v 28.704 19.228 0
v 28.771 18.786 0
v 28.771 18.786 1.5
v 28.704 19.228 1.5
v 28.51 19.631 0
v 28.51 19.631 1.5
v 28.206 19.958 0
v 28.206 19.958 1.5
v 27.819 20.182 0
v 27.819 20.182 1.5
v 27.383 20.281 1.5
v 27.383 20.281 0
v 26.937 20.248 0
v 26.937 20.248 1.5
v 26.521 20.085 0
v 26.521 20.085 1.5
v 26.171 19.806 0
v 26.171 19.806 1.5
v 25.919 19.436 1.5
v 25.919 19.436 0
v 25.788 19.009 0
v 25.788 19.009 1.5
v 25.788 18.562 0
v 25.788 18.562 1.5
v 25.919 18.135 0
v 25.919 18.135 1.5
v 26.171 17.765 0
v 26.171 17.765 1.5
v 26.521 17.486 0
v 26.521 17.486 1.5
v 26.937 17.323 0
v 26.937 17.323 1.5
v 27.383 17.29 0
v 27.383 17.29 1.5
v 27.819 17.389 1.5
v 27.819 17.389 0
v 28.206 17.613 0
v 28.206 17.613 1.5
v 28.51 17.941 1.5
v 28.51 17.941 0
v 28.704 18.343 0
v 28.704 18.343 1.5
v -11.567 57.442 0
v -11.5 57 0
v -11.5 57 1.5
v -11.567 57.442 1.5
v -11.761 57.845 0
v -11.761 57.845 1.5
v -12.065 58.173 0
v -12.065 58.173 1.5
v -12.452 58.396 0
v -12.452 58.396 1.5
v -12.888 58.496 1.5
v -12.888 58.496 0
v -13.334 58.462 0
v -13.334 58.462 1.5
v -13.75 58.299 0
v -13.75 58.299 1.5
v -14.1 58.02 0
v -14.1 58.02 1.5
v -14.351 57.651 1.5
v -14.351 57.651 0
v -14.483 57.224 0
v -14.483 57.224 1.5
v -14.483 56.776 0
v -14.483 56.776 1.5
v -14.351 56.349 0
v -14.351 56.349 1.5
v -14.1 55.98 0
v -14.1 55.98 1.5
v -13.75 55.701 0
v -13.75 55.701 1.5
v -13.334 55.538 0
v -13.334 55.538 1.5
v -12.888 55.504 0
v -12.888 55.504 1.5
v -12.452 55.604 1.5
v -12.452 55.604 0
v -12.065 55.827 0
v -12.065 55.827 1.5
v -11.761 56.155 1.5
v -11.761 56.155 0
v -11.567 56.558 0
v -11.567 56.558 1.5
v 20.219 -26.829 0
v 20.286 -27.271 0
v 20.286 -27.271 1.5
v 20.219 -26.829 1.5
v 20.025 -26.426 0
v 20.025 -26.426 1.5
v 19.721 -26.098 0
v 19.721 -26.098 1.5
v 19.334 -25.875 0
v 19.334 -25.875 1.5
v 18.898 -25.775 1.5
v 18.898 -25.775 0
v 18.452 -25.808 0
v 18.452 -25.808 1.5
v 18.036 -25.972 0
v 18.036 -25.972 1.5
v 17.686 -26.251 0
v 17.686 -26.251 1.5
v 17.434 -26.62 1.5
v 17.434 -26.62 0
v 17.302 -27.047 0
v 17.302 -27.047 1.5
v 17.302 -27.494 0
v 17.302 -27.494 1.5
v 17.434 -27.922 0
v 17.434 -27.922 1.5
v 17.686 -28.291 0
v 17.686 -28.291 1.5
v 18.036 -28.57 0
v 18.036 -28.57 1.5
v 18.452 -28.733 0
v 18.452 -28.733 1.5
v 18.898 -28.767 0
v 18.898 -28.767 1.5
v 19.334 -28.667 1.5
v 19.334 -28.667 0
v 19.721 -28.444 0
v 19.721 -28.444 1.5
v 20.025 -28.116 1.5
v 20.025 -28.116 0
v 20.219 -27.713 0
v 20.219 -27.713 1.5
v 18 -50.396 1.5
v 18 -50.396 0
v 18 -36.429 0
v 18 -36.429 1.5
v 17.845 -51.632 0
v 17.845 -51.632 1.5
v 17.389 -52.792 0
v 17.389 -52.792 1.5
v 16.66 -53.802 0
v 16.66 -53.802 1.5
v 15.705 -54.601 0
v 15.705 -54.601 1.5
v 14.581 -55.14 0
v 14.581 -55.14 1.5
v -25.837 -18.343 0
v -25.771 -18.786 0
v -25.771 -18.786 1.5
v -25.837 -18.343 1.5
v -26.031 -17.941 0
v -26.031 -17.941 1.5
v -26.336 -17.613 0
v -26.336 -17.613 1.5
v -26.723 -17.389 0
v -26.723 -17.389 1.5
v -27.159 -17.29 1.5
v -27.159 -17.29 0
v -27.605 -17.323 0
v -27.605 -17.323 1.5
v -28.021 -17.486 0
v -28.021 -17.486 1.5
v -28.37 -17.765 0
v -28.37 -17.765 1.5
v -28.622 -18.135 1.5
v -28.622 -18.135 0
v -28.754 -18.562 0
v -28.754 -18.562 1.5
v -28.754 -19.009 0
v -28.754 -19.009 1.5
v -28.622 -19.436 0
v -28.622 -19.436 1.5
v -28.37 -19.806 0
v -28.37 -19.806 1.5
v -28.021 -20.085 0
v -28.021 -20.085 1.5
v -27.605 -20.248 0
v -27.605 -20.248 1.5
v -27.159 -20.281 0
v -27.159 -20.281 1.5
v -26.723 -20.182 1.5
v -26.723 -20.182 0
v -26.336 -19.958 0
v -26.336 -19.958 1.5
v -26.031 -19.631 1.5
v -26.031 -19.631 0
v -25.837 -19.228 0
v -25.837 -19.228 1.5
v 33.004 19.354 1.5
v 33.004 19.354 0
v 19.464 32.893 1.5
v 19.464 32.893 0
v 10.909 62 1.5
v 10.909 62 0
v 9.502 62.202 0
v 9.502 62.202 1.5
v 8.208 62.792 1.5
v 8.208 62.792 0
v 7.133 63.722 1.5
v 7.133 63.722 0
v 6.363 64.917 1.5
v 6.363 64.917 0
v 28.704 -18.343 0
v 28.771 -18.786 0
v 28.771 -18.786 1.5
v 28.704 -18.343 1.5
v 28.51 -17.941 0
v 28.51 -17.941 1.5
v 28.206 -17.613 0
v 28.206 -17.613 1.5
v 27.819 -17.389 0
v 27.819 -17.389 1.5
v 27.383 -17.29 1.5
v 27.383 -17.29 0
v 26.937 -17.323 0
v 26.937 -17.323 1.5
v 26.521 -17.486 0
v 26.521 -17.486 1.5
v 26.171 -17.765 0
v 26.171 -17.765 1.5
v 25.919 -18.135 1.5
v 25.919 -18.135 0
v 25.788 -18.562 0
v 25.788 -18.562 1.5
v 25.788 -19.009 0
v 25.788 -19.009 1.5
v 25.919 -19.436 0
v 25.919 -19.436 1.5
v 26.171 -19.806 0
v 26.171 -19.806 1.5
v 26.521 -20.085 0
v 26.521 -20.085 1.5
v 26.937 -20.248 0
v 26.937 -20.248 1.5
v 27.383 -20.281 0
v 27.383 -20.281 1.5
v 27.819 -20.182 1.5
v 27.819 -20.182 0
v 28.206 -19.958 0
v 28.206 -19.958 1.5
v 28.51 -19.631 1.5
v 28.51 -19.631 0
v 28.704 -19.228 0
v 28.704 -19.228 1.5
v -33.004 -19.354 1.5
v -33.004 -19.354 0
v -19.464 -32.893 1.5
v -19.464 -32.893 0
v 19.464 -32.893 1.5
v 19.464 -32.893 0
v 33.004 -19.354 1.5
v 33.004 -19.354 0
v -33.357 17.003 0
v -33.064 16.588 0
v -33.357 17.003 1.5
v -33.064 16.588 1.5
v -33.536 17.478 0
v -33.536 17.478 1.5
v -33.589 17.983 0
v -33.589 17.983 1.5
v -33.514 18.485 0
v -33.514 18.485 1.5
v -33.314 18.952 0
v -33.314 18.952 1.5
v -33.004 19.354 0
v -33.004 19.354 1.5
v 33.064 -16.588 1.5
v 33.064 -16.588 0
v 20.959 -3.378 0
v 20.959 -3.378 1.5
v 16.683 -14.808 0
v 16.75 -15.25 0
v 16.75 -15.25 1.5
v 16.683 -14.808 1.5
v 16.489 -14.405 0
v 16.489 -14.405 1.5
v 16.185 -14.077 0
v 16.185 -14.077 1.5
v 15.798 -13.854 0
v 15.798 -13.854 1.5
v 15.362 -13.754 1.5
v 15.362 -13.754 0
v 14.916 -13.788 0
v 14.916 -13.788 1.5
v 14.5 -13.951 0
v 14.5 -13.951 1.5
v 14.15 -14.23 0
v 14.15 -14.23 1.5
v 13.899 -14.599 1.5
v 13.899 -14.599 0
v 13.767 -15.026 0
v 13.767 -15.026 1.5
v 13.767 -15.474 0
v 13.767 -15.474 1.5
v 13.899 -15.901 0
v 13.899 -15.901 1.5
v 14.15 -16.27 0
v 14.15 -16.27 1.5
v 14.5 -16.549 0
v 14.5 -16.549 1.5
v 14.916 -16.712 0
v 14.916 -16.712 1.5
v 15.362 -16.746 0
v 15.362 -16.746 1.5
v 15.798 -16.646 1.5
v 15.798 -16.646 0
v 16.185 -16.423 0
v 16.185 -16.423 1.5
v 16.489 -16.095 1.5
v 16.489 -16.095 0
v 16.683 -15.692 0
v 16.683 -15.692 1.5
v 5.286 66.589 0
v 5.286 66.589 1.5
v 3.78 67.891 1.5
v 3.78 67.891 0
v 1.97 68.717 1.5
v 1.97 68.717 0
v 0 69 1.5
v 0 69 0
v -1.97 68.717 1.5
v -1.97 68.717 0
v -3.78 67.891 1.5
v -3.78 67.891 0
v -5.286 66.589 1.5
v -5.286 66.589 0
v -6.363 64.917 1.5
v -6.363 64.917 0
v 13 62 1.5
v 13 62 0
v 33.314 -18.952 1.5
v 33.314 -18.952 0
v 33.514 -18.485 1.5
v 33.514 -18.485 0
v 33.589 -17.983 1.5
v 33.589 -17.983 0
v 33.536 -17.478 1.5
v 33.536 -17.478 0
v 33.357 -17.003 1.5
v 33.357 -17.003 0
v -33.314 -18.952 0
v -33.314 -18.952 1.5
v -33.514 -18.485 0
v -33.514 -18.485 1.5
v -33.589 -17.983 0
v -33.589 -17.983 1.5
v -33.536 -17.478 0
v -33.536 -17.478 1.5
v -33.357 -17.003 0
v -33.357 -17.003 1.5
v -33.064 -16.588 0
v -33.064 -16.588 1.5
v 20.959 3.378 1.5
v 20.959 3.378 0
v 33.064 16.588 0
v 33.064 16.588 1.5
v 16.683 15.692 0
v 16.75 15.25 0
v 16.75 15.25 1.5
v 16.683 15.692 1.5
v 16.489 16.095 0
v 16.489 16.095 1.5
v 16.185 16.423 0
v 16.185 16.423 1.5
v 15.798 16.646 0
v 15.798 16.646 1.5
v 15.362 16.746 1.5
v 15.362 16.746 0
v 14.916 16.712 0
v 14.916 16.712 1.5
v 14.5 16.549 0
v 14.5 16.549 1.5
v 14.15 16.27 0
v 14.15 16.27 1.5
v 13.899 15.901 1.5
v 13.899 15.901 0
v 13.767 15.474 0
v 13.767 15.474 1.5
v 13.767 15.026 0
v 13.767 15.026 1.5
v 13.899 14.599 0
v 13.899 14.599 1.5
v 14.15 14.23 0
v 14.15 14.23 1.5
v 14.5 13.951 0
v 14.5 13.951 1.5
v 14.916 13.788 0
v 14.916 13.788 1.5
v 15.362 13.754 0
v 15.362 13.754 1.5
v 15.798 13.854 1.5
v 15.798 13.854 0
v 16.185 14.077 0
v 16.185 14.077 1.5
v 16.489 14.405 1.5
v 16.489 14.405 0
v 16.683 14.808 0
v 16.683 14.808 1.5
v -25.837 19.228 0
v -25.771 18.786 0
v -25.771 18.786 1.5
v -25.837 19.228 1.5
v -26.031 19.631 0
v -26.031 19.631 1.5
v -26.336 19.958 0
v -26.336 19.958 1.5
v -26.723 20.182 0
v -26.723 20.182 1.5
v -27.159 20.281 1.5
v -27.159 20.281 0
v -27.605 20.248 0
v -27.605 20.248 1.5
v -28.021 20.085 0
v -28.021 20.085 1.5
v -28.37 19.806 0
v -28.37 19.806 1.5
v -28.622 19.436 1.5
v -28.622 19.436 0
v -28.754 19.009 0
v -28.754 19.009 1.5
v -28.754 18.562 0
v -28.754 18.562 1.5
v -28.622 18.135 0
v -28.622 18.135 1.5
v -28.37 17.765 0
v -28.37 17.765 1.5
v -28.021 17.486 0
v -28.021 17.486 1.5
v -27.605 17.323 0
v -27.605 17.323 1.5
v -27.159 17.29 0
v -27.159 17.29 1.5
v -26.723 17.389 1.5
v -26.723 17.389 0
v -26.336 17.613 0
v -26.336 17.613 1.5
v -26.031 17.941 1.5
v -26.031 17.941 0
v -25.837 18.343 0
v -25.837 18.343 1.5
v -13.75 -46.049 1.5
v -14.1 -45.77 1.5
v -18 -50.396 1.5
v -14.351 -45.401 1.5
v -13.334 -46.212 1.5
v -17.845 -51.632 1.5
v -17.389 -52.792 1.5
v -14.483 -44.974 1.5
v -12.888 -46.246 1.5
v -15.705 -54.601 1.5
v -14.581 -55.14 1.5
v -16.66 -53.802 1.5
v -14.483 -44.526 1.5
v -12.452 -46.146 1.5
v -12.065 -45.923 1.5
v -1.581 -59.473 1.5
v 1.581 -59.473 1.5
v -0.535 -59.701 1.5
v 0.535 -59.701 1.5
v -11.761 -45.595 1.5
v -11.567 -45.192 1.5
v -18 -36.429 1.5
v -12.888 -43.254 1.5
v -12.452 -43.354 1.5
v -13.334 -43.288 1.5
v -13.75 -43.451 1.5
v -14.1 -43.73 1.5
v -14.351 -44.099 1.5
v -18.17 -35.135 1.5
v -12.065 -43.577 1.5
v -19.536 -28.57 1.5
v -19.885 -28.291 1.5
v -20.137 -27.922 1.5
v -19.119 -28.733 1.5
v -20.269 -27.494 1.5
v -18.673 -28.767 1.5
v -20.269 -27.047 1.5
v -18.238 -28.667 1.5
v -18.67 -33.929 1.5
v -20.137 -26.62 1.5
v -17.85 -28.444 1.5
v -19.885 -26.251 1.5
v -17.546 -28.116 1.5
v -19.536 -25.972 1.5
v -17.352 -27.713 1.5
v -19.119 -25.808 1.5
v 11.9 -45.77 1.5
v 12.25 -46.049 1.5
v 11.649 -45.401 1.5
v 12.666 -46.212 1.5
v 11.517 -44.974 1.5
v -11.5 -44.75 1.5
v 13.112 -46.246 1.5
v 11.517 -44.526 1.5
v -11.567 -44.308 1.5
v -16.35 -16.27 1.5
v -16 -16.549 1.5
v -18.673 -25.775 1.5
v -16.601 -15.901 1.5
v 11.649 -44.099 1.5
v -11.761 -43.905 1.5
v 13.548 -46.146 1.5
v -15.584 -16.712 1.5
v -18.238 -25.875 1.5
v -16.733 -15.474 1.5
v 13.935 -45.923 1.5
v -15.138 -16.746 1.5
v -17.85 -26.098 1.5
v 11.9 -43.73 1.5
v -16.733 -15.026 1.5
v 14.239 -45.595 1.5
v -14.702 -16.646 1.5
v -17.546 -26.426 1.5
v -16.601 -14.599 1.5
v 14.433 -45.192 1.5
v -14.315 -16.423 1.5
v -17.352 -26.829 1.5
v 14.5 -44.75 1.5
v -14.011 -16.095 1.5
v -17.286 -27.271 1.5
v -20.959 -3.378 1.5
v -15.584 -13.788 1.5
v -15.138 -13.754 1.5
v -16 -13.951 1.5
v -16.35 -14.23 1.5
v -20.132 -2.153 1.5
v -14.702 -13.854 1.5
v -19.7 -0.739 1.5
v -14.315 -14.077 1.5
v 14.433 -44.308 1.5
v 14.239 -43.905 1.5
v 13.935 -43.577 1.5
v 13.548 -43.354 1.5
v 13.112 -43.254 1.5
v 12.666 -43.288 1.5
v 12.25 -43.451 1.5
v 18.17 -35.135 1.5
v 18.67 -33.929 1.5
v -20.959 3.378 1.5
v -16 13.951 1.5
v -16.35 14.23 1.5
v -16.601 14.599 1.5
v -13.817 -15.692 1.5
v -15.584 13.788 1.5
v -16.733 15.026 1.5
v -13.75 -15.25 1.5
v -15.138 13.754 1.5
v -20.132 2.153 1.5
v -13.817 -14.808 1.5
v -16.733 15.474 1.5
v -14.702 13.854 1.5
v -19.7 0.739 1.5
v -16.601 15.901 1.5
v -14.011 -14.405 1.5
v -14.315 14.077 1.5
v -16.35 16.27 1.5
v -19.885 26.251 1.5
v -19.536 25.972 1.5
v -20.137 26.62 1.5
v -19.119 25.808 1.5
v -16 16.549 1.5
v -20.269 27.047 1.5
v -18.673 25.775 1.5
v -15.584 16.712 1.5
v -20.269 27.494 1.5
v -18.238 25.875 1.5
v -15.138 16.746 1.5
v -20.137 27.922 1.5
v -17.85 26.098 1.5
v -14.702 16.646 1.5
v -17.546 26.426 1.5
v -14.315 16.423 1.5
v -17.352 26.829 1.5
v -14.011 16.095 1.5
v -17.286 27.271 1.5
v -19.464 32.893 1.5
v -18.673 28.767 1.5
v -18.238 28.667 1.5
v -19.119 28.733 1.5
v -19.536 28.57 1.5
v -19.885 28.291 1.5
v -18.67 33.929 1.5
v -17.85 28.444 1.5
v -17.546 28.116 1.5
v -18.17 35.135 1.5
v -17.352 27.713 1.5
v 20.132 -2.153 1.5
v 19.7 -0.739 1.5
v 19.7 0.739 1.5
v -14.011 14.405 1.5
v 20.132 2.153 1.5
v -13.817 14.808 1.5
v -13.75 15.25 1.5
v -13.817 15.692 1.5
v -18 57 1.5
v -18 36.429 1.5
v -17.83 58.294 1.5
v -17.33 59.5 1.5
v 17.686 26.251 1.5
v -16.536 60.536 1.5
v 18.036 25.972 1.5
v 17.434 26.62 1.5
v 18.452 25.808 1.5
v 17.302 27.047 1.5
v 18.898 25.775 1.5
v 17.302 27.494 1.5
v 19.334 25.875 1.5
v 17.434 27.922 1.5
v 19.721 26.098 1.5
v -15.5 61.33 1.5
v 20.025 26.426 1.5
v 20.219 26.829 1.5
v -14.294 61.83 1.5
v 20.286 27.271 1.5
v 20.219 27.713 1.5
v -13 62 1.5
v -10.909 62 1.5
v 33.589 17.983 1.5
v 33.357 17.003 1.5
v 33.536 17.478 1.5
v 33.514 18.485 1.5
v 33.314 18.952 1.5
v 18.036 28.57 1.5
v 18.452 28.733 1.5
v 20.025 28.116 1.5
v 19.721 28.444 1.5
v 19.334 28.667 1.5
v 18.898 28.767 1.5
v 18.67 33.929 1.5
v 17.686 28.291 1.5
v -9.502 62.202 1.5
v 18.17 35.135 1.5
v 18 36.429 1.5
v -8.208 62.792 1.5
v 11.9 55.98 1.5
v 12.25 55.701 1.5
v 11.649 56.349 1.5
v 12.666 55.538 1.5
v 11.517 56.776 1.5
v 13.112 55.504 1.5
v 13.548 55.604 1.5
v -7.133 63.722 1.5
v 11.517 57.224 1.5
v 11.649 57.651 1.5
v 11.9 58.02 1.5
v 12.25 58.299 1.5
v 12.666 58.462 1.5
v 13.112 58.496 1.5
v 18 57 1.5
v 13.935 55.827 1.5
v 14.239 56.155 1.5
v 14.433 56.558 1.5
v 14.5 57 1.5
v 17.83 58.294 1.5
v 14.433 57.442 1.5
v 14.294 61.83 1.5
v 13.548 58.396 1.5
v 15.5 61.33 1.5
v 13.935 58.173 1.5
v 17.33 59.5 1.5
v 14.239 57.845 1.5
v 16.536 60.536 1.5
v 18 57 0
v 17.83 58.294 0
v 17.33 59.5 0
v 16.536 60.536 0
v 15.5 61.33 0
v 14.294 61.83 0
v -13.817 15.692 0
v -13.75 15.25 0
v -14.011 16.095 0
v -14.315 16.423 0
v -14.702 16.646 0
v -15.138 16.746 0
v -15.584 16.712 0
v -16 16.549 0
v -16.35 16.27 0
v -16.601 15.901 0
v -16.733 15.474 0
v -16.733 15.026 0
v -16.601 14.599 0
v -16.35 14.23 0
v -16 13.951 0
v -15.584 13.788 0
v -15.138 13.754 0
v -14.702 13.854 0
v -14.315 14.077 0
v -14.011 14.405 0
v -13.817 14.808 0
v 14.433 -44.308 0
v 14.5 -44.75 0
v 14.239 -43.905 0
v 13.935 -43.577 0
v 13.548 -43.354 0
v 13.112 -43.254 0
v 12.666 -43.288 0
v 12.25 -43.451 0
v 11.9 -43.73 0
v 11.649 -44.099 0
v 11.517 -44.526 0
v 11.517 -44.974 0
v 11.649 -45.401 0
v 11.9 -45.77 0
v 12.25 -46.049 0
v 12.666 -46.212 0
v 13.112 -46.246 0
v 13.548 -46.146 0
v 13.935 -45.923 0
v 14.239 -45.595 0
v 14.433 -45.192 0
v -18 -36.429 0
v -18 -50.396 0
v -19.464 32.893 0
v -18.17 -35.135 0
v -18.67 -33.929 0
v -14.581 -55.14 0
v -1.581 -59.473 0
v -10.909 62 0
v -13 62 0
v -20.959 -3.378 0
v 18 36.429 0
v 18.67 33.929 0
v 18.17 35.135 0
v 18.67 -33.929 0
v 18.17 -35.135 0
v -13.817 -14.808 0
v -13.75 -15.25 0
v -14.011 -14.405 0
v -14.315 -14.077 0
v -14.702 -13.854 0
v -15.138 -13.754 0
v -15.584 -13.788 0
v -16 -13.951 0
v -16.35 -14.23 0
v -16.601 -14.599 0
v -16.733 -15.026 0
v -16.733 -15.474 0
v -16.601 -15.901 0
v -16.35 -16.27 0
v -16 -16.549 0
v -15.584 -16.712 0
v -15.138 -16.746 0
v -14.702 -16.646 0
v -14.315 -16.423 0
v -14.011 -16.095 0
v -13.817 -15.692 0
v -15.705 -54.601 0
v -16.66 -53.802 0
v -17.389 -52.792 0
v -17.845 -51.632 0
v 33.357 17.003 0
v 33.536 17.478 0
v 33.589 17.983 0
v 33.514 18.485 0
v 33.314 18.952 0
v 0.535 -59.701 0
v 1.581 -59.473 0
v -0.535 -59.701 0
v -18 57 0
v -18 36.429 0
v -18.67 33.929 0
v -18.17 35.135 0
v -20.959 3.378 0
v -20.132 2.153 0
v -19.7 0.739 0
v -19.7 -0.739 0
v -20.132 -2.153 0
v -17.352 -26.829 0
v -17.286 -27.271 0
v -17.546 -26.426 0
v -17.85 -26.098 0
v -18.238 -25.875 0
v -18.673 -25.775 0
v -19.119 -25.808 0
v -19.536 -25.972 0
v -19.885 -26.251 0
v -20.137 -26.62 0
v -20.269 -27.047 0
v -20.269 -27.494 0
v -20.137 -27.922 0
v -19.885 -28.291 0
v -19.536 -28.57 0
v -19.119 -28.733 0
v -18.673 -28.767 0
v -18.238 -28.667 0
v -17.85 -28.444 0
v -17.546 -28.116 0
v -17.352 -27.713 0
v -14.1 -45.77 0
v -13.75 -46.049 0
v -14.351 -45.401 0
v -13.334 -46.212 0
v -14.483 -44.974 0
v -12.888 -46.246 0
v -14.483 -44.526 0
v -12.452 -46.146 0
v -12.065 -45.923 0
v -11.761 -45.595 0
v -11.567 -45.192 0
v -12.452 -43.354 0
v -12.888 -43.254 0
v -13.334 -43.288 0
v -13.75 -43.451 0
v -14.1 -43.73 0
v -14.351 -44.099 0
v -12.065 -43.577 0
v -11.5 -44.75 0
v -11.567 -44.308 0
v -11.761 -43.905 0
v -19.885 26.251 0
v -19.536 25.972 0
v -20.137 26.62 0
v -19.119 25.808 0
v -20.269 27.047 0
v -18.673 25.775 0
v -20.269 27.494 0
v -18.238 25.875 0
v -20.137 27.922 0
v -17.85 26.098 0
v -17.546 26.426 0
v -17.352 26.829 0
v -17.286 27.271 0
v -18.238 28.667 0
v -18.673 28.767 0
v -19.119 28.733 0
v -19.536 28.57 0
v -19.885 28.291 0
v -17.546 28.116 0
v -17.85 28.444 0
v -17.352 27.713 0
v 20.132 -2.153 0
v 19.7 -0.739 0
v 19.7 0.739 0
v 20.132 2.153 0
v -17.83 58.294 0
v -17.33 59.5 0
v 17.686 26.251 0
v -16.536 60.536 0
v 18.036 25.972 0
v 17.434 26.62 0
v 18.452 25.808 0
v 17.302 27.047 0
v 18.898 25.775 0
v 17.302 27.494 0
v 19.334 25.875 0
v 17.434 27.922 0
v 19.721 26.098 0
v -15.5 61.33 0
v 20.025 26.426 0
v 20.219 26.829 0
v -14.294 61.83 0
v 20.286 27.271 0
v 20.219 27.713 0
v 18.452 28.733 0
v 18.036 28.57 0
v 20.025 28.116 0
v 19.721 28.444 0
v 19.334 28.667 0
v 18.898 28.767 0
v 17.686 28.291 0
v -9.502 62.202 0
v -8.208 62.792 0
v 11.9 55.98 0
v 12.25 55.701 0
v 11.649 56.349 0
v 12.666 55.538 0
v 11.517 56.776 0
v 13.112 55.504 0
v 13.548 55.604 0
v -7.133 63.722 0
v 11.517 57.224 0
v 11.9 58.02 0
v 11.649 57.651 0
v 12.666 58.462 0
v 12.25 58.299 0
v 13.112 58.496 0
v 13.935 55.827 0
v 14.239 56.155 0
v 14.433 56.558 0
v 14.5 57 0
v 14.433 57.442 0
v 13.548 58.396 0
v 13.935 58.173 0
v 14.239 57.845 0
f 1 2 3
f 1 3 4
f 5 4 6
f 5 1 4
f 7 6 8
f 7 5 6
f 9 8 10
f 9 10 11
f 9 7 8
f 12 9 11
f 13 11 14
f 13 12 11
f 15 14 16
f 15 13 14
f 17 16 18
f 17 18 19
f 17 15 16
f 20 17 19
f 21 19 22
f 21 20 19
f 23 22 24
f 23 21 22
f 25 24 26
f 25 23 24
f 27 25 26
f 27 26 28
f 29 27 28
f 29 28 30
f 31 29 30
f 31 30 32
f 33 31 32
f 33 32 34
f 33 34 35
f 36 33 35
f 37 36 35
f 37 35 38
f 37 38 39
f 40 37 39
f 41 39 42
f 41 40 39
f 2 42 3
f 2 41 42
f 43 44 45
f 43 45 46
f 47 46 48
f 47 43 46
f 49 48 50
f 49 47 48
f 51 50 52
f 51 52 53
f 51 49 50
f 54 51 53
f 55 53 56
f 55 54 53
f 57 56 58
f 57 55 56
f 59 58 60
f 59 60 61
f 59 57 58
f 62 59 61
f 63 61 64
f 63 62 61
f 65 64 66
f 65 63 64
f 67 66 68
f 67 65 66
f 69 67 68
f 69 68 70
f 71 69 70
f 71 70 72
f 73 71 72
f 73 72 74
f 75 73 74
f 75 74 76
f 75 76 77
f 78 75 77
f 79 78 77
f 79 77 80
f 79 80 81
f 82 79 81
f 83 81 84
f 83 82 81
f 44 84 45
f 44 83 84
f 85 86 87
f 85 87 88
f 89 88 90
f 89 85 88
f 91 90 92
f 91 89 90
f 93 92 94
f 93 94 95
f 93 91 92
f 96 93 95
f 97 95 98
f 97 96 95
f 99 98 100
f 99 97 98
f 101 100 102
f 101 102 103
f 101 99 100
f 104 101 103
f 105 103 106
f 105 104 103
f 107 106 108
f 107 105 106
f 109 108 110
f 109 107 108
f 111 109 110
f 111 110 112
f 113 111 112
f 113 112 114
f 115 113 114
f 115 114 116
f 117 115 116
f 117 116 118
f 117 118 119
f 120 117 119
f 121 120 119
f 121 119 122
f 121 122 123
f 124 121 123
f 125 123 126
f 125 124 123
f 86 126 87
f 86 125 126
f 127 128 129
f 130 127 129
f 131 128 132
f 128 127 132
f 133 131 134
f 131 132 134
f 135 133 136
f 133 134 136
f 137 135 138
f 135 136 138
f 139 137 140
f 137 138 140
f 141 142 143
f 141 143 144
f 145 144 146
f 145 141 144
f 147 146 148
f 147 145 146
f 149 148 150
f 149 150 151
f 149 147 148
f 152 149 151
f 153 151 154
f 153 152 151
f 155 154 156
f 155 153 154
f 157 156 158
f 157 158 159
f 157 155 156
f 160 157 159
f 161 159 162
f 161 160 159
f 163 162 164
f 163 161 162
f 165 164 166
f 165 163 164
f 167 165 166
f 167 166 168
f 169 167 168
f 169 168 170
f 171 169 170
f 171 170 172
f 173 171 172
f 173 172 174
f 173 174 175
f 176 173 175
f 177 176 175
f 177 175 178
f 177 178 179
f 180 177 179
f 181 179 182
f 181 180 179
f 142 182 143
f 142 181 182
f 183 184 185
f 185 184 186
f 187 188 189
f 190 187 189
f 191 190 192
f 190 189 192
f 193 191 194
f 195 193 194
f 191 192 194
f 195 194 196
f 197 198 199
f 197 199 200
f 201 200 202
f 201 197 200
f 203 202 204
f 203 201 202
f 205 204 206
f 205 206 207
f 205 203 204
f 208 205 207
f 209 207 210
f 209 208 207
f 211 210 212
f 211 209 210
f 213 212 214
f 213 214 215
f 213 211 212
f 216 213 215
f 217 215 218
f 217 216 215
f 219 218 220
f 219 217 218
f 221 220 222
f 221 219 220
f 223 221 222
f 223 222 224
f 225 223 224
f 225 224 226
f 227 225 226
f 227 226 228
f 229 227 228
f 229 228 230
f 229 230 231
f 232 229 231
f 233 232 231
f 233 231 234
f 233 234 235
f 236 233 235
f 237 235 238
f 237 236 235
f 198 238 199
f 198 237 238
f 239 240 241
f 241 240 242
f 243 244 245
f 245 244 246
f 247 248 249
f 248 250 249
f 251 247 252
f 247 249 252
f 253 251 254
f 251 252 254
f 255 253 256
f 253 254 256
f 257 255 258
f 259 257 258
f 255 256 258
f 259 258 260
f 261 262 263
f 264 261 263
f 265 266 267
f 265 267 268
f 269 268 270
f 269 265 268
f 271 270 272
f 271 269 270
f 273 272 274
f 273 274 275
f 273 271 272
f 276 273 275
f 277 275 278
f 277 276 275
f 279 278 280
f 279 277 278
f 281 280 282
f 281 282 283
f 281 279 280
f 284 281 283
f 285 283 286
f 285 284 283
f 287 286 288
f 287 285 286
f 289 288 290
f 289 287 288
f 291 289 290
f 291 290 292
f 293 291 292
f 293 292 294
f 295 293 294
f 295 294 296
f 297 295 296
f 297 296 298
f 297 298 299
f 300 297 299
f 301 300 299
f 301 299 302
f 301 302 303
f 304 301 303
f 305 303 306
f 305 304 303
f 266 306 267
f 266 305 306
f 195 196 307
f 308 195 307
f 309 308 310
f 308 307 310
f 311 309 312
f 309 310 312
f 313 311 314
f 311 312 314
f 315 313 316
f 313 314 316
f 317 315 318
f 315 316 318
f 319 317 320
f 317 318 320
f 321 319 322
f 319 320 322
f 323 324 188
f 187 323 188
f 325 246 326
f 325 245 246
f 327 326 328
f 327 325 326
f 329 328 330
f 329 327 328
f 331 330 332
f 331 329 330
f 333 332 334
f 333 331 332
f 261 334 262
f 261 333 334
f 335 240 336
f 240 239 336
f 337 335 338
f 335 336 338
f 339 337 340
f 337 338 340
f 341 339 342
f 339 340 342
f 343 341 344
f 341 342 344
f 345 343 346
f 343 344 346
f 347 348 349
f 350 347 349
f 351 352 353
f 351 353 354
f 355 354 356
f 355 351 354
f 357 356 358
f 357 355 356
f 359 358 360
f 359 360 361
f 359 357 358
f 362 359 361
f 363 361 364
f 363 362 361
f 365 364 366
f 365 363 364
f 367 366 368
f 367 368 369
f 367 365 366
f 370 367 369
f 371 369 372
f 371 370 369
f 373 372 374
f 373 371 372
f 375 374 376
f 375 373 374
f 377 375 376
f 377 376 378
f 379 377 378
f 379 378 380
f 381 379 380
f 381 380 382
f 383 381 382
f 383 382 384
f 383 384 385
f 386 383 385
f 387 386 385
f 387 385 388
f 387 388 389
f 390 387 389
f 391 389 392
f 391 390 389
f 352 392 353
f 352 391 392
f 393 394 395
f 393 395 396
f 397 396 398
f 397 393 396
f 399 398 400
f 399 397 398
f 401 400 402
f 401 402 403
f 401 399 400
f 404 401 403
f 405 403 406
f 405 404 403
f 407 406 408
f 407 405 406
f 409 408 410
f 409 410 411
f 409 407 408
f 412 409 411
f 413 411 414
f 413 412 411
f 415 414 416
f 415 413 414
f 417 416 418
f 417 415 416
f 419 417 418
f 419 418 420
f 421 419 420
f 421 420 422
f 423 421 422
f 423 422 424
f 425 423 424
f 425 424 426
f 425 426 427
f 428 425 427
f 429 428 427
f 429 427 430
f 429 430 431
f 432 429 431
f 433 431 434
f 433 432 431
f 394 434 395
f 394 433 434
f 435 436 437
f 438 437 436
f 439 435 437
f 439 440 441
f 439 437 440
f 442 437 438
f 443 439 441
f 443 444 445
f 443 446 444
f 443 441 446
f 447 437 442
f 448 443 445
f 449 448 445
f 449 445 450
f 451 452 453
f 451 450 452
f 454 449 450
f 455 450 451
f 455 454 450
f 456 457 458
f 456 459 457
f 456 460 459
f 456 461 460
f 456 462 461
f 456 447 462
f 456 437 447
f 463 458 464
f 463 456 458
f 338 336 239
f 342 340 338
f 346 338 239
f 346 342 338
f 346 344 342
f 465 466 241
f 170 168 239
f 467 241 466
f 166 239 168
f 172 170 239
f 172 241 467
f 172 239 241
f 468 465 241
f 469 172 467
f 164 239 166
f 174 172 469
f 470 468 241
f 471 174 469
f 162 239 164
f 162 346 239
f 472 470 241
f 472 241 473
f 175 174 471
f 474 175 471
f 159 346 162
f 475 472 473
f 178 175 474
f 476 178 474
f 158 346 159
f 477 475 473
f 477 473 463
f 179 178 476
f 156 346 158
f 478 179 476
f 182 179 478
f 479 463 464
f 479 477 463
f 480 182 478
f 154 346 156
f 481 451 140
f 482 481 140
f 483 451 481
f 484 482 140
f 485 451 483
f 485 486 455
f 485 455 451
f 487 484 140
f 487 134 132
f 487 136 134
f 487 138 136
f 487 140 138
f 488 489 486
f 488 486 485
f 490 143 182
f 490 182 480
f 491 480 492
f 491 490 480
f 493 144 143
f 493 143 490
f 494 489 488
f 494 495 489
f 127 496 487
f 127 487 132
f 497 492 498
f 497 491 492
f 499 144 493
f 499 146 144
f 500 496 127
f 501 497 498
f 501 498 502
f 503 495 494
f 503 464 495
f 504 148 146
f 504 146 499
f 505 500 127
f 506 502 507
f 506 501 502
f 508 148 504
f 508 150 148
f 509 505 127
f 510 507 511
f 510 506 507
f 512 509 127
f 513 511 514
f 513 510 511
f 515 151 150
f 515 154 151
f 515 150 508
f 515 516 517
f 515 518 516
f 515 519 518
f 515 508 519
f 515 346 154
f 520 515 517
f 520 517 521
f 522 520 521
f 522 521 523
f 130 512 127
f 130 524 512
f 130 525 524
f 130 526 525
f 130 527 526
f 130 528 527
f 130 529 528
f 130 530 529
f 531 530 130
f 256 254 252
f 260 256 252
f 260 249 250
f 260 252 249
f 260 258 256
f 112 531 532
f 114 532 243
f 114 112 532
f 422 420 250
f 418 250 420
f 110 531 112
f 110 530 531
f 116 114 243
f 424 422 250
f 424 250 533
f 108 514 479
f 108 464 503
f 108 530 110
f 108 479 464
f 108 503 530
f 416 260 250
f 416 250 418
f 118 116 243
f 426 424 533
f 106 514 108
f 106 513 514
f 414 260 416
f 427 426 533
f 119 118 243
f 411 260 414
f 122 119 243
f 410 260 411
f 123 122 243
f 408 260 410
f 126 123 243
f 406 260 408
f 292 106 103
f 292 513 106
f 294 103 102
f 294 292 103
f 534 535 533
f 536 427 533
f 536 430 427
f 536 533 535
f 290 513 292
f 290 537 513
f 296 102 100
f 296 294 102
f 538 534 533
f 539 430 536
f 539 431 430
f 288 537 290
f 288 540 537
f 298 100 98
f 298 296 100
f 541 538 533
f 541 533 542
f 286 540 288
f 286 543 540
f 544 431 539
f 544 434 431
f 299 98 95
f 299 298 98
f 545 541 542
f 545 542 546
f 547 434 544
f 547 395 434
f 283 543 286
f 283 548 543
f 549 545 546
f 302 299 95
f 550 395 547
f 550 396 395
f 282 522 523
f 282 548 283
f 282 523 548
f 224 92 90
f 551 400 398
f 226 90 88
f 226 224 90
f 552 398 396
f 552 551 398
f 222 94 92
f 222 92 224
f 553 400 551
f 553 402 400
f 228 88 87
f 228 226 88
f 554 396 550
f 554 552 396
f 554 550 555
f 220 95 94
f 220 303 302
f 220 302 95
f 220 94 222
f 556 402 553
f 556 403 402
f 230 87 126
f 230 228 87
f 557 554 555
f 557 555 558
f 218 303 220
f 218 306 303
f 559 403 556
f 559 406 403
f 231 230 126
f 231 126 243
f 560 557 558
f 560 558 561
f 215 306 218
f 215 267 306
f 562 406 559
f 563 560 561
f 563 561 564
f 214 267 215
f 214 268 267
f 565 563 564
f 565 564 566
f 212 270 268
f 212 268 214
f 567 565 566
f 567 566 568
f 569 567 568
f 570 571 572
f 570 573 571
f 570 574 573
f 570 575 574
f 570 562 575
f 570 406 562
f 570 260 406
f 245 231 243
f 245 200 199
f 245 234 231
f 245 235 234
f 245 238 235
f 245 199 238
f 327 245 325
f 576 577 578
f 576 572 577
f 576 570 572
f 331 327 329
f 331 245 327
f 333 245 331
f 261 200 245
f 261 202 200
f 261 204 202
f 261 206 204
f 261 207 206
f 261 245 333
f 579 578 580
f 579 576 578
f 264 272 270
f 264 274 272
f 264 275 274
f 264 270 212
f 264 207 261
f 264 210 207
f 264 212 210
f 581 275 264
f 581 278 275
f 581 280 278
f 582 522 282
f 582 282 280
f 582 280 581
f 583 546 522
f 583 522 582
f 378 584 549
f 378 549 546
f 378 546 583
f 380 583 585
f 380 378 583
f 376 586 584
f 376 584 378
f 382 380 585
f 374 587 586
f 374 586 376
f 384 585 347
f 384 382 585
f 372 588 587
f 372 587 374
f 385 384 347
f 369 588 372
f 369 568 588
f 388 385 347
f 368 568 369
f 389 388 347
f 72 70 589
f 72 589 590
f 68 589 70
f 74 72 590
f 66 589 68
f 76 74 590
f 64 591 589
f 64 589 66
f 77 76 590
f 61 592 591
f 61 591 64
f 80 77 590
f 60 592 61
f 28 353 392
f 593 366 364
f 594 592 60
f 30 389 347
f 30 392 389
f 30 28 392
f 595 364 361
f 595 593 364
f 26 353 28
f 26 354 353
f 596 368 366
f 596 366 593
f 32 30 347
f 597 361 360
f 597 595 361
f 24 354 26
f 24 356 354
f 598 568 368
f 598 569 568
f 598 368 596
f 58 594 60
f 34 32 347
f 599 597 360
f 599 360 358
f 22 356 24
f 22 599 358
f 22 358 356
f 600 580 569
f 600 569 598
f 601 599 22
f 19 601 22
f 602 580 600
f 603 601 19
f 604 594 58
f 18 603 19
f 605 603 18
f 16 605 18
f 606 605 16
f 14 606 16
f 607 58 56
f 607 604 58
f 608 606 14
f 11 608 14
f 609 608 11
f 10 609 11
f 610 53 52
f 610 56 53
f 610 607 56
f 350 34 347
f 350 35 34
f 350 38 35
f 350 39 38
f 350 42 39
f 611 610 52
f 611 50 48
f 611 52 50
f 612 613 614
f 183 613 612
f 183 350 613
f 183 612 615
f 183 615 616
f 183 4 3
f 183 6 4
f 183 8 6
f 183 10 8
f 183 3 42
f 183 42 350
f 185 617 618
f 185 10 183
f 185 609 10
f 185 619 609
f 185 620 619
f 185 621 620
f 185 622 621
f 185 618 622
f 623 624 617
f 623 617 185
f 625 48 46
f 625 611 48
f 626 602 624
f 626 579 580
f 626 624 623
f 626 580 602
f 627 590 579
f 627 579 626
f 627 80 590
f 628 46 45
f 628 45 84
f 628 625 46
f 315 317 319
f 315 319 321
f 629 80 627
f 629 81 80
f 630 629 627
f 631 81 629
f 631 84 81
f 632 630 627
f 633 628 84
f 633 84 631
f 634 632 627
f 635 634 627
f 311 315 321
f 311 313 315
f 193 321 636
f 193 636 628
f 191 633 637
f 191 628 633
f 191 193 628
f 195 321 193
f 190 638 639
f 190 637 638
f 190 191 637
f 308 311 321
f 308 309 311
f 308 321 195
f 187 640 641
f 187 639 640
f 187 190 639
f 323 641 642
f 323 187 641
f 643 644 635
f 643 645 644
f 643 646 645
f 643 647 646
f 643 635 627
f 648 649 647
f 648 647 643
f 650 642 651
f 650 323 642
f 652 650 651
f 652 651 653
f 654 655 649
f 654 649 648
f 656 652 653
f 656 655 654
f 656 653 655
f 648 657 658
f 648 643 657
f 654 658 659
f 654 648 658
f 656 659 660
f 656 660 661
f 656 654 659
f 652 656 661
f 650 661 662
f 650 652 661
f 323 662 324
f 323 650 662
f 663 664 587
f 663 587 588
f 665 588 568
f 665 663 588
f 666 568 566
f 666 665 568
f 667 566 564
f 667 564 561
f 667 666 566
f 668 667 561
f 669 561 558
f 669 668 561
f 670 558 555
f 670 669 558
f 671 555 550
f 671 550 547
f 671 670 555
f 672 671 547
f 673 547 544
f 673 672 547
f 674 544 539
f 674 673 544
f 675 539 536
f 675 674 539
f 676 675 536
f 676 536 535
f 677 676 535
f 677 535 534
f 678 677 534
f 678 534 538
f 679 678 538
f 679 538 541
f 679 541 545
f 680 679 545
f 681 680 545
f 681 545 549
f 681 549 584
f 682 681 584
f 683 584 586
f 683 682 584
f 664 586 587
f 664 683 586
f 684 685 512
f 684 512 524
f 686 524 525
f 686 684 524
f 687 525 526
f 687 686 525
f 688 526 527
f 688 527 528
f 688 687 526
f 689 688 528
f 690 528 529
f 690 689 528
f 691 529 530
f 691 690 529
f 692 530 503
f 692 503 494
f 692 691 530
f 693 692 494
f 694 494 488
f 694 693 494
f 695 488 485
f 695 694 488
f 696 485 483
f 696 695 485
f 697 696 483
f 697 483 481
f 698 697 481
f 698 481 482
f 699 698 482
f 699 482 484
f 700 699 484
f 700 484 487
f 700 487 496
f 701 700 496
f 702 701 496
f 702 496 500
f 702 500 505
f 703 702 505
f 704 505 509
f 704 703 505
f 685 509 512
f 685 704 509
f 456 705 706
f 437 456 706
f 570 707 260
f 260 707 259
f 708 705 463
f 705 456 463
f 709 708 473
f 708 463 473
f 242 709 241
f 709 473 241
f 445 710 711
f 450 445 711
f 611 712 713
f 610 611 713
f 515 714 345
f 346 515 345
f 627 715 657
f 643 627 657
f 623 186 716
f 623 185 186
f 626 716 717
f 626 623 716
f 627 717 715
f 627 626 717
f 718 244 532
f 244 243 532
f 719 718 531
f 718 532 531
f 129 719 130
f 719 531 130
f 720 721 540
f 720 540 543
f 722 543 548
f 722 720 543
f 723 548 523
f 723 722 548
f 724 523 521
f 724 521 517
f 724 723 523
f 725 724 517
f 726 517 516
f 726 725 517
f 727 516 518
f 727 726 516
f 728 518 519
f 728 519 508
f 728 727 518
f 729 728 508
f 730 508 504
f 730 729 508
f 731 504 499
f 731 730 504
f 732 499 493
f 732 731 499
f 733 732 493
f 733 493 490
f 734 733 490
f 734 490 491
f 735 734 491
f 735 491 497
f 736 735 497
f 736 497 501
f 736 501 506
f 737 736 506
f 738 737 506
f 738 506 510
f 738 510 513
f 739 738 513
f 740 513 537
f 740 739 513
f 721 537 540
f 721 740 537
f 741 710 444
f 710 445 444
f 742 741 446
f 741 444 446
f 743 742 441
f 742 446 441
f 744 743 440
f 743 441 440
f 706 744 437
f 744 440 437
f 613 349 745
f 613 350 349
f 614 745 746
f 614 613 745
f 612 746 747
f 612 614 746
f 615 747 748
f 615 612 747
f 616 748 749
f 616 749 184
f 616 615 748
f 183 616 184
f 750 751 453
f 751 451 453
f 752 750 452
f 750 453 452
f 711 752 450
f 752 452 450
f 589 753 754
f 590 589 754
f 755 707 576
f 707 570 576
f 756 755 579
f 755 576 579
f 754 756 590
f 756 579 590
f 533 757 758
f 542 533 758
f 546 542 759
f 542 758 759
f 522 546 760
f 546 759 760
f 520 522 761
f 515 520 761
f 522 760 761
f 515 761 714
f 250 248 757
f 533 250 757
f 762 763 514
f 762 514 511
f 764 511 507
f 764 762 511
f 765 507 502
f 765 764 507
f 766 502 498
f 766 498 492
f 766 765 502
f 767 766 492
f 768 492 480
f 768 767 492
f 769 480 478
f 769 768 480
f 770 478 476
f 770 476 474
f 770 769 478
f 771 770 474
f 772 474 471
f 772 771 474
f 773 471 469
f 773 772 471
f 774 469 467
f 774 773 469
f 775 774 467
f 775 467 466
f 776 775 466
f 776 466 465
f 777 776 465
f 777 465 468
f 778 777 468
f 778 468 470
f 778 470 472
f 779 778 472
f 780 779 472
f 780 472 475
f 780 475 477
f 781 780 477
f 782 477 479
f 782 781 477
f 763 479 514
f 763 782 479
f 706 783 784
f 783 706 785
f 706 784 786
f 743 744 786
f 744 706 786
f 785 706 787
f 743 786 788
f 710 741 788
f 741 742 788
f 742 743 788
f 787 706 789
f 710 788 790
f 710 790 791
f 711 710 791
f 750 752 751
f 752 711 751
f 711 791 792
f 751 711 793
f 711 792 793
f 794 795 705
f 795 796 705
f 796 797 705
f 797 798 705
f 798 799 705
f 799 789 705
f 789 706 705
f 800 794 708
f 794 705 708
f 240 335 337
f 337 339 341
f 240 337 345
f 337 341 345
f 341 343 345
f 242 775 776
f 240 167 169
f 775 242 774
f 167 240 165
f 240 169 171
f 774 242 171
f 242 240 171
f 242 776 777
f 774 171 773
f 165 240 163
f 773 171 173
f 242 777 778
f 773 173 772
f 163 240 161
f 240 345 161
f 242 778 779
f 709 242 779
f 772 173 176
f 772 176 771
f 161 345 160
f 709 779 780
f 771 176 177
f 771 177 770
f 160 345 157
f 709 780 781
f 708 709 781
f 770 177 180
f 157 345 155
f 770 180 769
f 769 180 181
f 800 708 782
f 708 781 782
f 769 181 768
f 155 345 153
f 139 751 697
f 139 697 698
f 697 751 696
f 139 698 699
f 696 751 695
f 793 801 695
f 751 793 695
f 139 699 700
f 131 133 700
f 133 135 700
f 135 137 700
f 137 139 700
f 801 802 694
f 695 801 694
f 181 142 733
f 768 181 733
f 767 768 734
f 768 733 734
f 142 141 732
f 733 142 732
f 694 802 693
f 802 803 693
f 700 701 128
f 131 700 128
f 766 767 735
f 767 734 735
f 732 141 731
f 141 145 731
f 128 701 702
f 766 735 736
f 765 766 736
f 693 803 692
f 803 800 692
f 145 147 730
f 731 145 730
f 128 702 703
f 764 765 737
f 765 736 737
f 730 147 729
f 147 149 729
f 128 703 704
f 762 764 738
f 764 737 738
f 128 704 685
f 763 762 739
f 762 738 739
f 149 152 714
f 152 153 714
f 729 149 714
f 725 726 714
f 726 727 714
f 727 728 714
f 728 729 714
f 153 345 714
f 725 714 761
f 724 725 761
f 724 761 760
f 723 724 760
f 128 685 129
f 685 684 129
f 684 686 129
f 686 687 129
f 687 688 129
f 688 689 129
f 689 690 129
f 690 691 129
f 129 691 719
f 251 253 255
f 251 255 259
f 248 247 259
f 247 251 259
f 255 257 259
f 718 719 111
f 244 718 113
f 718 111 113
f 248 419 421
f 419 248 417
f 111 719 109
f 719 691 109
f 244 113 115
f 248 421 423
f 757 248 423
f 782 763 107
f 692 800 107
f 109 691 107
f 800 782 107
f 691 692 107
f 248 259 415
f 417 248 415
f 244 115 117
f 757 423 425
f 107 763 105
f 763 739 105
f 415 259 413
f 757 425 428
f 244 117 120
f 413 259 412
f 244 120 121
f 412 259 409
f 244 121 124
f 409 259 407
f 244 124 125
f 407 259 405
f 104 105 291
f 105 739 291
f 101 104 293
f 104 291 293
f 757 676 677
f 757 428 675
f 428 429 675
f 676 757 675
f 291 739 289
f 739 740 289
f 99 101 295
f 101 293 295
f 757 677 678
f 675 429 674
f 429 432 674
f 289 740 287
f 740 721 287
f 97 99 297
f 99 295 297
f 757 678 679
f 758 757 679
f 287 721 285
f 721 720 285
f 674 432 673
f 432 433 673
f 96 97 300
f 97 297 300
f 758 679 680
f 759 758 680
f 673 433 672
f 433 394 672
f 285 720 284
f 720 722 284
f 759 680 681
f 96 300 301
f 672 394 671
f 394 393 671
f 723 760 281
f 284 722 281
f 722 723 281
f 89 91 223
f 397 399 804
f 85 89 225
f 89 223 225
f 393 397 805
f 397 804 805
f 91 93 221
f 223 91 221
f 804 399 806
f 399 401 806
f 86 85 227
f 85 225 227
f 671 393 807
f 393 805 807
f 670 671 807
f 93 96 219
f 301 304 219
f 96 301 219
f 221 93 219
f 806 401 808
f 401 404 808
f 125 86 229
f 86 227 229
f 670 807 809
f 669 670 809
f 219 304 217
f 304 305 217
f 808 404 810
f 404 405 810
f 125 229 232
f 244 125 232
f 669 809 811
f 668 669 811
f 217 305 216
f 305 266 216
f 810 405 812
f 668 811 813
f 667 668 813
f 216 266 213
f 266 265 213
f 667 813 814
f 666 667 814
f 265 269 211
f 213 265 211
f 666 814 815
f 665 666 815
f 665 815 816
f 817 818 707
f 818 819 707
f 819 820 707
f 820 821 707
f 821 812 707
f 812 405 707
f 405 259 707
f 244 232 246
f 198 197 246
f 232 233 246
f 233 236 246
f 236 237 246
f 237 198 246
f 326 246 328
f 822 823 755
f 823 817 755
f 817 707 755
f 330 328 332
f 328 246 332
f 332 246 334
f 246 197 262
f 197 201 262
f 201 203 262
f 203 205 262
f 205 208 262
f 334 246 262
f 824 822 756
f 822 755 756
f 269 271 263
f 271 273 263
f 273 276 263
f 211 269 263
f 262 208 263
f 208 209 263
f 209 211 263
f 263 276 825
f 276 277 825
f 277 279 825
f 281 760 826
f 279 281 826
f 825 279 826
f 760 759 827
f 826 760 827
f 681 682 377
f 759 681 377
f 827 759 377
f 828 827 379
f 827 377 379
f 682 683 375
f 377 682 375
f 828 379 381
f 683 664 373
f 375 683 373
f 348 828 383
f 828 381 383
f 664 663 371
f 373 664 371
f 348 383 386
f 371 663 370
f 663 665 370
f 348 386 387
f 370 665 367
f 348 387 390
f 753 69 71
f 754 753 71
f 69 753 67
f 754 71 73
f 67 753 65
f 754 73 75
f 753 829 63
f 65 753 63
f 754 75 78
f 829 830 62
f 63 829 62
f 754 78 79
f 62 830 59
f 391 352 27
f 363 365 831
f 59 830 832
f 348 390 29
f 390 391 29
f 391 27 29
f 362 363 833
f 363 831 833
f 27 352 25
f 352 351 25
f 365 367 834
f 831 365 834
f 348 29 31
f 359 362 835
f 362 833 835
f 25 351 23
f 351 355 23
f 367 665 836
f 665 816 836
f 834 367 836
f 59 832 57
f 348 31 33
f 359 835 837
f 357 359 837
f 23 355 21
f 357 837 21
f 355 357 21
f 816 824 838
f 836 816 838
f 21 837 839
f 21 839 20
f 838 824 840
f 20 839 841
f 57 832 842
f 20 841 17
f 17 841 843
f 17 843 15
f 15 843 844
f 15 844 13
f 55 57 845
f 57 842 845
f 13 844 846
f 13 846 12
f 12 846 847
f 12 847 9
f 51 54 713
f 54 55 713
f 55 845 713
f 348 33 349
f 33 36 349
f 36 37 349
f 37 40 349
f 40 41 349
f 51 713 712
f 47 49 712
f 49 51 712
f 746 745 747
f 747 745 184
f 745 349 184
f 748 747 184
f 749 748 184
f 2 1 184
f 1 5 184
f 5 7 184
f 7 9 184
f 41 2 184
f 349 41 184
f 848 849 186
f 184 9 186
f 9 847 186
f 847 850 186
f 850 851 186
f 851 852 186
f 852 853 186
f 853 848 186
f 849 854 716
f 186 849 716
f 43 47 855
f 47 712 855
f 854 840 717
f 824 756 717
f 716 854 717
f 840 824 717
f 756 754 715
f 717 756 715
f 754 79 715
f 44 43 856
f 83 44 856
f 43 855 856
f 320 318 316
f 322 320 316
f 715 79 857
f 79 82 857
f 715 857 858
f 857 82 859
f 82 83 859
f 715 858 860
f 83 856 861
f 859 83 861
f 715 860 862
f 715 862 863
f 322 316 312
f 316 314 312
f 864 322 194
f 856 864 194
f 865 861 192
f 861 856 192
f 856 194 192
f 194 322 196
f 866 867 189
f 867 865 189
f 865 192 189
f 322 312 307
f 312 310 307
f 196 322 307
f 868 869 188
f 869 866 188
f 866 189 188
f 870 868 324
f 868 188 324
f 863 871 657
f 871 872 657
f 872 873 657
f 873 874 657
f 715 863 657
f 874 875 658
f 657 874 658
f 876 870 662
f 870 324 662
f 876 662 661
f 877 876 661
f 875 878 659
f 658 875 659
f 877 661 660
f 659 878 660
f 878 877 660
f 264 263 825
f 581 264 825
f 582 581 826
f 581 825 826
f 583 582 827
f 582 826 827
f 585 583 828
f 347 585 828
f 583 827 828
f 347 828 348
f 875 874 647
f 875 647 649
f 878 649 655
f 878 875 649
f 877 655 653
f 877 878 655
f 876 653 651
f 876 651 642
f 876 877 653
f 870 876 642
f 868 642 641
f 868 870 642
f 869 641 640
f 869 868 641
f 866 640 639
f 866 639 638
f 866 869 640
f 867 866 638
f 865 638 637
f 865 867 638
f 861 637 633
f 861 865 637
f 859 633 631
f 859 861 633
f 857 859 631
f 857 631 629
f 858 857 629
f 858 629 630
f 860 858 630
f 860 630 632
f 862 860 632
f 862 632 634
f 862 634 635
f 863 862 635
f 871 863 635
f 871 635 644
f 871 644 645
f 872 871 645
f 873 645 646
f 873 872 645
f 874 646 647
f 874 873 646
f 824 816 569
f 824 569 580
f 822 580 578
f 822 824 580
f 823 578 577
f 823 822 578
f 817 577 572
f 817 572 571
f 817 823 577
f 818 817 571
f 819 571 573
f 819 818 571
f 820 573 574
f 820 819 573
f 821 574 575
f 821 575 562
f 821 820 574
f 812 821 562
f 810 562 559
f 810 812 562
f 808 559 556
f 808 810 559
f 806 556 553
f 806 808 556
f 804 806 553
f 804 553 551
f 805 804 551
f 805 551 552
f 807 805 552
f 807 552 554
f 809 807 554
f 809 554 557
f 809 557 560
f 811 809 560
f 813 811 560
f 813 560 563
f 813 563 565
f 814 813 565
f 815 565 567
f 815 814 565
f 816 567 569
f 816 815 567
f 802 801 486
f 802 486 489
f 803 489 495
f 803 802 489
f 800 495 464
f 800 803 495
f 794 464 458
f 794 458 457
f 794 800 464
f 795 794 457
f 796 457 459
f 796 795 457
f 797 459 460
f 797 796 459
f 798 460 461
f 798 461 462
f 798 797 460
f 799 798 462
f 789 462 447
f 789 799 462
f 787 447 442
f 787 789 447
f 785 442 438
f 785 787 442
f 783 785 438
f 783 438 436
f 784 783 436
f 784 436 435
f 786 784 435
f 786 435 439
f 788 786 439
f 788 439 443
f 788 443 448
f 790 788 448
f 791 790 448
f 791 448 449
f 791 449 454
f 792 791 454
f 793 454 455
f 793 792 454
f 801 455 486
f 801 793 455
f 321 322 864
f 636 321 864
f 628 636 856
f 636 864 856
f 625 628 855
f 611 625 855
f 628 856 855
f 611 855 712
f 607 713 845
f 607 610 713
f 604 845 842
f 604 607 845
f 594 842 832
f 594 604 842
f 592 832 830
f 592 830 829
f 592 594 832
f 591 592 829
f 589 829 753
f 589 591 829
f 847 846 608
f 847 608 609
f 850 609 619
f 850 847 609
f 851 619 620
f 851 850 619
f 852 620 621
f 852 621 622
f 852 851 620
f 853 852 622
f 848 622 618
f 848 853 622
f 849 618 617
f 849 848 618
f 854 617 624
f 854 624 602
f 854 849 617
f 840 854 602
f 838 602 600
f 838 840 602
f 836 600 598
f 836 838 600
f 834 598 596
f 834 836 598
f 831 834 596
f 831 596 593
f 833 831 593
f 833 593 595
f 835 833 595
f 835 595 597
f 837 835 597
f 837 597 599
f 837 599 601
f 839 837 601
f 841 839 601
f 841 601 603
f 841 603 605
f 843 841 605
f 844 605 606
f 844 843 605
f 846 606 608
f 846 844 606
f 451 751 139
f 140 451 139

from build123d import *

# Parameters (mm, degrees)
F0_R     = 1.5
F1_DEPTH = 1.5
F2_R     = 5
F3_R     = 2


with BuildPart() as f1:
    # F0 (on Top) → F1 (new body)
    with BuildSketch(Plane.XY):
        with BuildLine():
            Line((34.3576592932, -18), (20.9590200014, -3.3779510381))
            ThreePointArc((20.9590200014, -3.3779510381), (19.6454066855, 0), (20.9590200014, 3.3779510381))
            Line((20.9590200014, 3.3779510381), (34.3576592932, 18))
            Line((34.3576592932, 18), (18, 34.3576592932))
            Line((18, 34.3576592932), (18, 62))
            Line((18, 62), (10.9087121146, 62))
            ThreePointArc((10.9087121146, 62), (8.2084034903, 62.7918729423), (6.3634154002, 64.9166666667))
            ThreePointArc((6.3634154002, 64.9166666667), (0, 69), (-6.3634154002, 64.9166666667))
            ThreePointArc((-6.3634154002, 64.9166666667), (-8.2084034903, 62.7918729423), (-10.9087121146, 62))
            Line((-10.9087121146, 62), (-18, 62))
            Line((-18, 62), (-18, 34.3576592932))
            Line((-18, 34.3576592932), (-34.3576592932, 18))
            Line((-34.3576592932, 18), (-20.9590200014, 3.3779510381))
            ThreePointArc((-20.9590200014, 3.3779510381), (-19.6454066855, 0), (-20.9590200014, -3.3779510381))
            Line((-20.9590200014, -3.3779510381), (-34.3576592932, -18))
            Line((-34.3576592932, -18), (-18, -34.3576592932))
            Line((-18, -34.3576592932), (-18, -54))
            Line((-18, -54), (0, -60))
            Line((0, -60), (18, -54))
            Line((18, -54), (18, -34.3576592932))
            Line((18, -34.3576592932), (34.3576592932, -18))
        make_face()
        with Locations((-13, -44.75)):
            Circle(F0_R, mode=Mode.SUBTRACT)
        with Locations((-27.2708152802, -18.7855339059)):
            Circle(F0_R, mode=Mode.SUBTRACT)
        with Locations((-18.7855339059, -27.2708152802)):
            Circle(F0_R, mode=Mode.SUBTRACT)
        with Locations((-15.25, -15.25)):
            Circle(F0_R, mode=Mode.SUBTRACT)
        with Locations((13, -44.75)):
            Circle(F0_R, mode=Mode.SUBTRACT)
        with Locations((15.25, -15.25)):
            Circle(F0_R, mode=Mode.SUBTRACT)
        with Locations((18.7855339059, -27.2708152802)):
            Circle(F0_R, mode=Mode.SUBTRACT)
        with Locations((27.2708152802, -18.7855339059)):
            Circle(F0_R, mode=Mode.SUBTRACT)
        with Locations((-27.2708152802, 18.7855339059)):
            Circle(F0_R, mode=Mode.SUBTRACT)
        with Locations((-18.7855339059, 27.2708152802)):
            Circle(F0_R, mode=Mode.SUBTRACT)
        with Locations((-15.25, 15.25)):
            Circle(F0_R, mode=Mode.SUBTRACT)
        with Locations((-13, 57)):
            Circle(F0_R, mode=Mode.SUBTRACT)
        with Locations((15.25, 15.25)):
            Circle(F0_R, mode=Mode.SUBTRACT)
        with Locations((27.2708152802, 18.7855339059)):
            Circle(F0_R, mode=Mode.SUBTRACT)
        with Locations((18.7855339059, 27.2708152802)):
            Circle(F0_R, mode=Mode.SUBTRACT)
        with Locations((13, 57)):
            Circle(F0_R, mode=Mode.SUBTRACT)
    extrude(amount=F1_DEPTH)

    # F2
    f2_edges = [f1.edges().sort_by_distance(p)[0] for p in [
        (-18, -54, 0.75),
        (0, -60, 0.75),
        (18, -54, 0.75),
        (-18, 62, 0.75),
        (-18, 34.357659, 0.75),
        (-18, -34.357659, 0.75),
        (18, -34.357659, 0.75),
        (18, 34.357659, 0.75),
        (18, 62, 0.75),
    ]]
    fillet(f2_edges, radius=F2_R)

    # F3
    f3_edges = [f1.edges().sort_by_distance(p)[0] for p in [
        (-34.357659, -18, 0.75),
        (-34.357659, 18, 0.75),
        (34.357659, 18, 0.75),
        (34.357659, -18, 0.75),
    ]]
    fillet(f3_edges, radius=F3_R)


solid = f1.part
